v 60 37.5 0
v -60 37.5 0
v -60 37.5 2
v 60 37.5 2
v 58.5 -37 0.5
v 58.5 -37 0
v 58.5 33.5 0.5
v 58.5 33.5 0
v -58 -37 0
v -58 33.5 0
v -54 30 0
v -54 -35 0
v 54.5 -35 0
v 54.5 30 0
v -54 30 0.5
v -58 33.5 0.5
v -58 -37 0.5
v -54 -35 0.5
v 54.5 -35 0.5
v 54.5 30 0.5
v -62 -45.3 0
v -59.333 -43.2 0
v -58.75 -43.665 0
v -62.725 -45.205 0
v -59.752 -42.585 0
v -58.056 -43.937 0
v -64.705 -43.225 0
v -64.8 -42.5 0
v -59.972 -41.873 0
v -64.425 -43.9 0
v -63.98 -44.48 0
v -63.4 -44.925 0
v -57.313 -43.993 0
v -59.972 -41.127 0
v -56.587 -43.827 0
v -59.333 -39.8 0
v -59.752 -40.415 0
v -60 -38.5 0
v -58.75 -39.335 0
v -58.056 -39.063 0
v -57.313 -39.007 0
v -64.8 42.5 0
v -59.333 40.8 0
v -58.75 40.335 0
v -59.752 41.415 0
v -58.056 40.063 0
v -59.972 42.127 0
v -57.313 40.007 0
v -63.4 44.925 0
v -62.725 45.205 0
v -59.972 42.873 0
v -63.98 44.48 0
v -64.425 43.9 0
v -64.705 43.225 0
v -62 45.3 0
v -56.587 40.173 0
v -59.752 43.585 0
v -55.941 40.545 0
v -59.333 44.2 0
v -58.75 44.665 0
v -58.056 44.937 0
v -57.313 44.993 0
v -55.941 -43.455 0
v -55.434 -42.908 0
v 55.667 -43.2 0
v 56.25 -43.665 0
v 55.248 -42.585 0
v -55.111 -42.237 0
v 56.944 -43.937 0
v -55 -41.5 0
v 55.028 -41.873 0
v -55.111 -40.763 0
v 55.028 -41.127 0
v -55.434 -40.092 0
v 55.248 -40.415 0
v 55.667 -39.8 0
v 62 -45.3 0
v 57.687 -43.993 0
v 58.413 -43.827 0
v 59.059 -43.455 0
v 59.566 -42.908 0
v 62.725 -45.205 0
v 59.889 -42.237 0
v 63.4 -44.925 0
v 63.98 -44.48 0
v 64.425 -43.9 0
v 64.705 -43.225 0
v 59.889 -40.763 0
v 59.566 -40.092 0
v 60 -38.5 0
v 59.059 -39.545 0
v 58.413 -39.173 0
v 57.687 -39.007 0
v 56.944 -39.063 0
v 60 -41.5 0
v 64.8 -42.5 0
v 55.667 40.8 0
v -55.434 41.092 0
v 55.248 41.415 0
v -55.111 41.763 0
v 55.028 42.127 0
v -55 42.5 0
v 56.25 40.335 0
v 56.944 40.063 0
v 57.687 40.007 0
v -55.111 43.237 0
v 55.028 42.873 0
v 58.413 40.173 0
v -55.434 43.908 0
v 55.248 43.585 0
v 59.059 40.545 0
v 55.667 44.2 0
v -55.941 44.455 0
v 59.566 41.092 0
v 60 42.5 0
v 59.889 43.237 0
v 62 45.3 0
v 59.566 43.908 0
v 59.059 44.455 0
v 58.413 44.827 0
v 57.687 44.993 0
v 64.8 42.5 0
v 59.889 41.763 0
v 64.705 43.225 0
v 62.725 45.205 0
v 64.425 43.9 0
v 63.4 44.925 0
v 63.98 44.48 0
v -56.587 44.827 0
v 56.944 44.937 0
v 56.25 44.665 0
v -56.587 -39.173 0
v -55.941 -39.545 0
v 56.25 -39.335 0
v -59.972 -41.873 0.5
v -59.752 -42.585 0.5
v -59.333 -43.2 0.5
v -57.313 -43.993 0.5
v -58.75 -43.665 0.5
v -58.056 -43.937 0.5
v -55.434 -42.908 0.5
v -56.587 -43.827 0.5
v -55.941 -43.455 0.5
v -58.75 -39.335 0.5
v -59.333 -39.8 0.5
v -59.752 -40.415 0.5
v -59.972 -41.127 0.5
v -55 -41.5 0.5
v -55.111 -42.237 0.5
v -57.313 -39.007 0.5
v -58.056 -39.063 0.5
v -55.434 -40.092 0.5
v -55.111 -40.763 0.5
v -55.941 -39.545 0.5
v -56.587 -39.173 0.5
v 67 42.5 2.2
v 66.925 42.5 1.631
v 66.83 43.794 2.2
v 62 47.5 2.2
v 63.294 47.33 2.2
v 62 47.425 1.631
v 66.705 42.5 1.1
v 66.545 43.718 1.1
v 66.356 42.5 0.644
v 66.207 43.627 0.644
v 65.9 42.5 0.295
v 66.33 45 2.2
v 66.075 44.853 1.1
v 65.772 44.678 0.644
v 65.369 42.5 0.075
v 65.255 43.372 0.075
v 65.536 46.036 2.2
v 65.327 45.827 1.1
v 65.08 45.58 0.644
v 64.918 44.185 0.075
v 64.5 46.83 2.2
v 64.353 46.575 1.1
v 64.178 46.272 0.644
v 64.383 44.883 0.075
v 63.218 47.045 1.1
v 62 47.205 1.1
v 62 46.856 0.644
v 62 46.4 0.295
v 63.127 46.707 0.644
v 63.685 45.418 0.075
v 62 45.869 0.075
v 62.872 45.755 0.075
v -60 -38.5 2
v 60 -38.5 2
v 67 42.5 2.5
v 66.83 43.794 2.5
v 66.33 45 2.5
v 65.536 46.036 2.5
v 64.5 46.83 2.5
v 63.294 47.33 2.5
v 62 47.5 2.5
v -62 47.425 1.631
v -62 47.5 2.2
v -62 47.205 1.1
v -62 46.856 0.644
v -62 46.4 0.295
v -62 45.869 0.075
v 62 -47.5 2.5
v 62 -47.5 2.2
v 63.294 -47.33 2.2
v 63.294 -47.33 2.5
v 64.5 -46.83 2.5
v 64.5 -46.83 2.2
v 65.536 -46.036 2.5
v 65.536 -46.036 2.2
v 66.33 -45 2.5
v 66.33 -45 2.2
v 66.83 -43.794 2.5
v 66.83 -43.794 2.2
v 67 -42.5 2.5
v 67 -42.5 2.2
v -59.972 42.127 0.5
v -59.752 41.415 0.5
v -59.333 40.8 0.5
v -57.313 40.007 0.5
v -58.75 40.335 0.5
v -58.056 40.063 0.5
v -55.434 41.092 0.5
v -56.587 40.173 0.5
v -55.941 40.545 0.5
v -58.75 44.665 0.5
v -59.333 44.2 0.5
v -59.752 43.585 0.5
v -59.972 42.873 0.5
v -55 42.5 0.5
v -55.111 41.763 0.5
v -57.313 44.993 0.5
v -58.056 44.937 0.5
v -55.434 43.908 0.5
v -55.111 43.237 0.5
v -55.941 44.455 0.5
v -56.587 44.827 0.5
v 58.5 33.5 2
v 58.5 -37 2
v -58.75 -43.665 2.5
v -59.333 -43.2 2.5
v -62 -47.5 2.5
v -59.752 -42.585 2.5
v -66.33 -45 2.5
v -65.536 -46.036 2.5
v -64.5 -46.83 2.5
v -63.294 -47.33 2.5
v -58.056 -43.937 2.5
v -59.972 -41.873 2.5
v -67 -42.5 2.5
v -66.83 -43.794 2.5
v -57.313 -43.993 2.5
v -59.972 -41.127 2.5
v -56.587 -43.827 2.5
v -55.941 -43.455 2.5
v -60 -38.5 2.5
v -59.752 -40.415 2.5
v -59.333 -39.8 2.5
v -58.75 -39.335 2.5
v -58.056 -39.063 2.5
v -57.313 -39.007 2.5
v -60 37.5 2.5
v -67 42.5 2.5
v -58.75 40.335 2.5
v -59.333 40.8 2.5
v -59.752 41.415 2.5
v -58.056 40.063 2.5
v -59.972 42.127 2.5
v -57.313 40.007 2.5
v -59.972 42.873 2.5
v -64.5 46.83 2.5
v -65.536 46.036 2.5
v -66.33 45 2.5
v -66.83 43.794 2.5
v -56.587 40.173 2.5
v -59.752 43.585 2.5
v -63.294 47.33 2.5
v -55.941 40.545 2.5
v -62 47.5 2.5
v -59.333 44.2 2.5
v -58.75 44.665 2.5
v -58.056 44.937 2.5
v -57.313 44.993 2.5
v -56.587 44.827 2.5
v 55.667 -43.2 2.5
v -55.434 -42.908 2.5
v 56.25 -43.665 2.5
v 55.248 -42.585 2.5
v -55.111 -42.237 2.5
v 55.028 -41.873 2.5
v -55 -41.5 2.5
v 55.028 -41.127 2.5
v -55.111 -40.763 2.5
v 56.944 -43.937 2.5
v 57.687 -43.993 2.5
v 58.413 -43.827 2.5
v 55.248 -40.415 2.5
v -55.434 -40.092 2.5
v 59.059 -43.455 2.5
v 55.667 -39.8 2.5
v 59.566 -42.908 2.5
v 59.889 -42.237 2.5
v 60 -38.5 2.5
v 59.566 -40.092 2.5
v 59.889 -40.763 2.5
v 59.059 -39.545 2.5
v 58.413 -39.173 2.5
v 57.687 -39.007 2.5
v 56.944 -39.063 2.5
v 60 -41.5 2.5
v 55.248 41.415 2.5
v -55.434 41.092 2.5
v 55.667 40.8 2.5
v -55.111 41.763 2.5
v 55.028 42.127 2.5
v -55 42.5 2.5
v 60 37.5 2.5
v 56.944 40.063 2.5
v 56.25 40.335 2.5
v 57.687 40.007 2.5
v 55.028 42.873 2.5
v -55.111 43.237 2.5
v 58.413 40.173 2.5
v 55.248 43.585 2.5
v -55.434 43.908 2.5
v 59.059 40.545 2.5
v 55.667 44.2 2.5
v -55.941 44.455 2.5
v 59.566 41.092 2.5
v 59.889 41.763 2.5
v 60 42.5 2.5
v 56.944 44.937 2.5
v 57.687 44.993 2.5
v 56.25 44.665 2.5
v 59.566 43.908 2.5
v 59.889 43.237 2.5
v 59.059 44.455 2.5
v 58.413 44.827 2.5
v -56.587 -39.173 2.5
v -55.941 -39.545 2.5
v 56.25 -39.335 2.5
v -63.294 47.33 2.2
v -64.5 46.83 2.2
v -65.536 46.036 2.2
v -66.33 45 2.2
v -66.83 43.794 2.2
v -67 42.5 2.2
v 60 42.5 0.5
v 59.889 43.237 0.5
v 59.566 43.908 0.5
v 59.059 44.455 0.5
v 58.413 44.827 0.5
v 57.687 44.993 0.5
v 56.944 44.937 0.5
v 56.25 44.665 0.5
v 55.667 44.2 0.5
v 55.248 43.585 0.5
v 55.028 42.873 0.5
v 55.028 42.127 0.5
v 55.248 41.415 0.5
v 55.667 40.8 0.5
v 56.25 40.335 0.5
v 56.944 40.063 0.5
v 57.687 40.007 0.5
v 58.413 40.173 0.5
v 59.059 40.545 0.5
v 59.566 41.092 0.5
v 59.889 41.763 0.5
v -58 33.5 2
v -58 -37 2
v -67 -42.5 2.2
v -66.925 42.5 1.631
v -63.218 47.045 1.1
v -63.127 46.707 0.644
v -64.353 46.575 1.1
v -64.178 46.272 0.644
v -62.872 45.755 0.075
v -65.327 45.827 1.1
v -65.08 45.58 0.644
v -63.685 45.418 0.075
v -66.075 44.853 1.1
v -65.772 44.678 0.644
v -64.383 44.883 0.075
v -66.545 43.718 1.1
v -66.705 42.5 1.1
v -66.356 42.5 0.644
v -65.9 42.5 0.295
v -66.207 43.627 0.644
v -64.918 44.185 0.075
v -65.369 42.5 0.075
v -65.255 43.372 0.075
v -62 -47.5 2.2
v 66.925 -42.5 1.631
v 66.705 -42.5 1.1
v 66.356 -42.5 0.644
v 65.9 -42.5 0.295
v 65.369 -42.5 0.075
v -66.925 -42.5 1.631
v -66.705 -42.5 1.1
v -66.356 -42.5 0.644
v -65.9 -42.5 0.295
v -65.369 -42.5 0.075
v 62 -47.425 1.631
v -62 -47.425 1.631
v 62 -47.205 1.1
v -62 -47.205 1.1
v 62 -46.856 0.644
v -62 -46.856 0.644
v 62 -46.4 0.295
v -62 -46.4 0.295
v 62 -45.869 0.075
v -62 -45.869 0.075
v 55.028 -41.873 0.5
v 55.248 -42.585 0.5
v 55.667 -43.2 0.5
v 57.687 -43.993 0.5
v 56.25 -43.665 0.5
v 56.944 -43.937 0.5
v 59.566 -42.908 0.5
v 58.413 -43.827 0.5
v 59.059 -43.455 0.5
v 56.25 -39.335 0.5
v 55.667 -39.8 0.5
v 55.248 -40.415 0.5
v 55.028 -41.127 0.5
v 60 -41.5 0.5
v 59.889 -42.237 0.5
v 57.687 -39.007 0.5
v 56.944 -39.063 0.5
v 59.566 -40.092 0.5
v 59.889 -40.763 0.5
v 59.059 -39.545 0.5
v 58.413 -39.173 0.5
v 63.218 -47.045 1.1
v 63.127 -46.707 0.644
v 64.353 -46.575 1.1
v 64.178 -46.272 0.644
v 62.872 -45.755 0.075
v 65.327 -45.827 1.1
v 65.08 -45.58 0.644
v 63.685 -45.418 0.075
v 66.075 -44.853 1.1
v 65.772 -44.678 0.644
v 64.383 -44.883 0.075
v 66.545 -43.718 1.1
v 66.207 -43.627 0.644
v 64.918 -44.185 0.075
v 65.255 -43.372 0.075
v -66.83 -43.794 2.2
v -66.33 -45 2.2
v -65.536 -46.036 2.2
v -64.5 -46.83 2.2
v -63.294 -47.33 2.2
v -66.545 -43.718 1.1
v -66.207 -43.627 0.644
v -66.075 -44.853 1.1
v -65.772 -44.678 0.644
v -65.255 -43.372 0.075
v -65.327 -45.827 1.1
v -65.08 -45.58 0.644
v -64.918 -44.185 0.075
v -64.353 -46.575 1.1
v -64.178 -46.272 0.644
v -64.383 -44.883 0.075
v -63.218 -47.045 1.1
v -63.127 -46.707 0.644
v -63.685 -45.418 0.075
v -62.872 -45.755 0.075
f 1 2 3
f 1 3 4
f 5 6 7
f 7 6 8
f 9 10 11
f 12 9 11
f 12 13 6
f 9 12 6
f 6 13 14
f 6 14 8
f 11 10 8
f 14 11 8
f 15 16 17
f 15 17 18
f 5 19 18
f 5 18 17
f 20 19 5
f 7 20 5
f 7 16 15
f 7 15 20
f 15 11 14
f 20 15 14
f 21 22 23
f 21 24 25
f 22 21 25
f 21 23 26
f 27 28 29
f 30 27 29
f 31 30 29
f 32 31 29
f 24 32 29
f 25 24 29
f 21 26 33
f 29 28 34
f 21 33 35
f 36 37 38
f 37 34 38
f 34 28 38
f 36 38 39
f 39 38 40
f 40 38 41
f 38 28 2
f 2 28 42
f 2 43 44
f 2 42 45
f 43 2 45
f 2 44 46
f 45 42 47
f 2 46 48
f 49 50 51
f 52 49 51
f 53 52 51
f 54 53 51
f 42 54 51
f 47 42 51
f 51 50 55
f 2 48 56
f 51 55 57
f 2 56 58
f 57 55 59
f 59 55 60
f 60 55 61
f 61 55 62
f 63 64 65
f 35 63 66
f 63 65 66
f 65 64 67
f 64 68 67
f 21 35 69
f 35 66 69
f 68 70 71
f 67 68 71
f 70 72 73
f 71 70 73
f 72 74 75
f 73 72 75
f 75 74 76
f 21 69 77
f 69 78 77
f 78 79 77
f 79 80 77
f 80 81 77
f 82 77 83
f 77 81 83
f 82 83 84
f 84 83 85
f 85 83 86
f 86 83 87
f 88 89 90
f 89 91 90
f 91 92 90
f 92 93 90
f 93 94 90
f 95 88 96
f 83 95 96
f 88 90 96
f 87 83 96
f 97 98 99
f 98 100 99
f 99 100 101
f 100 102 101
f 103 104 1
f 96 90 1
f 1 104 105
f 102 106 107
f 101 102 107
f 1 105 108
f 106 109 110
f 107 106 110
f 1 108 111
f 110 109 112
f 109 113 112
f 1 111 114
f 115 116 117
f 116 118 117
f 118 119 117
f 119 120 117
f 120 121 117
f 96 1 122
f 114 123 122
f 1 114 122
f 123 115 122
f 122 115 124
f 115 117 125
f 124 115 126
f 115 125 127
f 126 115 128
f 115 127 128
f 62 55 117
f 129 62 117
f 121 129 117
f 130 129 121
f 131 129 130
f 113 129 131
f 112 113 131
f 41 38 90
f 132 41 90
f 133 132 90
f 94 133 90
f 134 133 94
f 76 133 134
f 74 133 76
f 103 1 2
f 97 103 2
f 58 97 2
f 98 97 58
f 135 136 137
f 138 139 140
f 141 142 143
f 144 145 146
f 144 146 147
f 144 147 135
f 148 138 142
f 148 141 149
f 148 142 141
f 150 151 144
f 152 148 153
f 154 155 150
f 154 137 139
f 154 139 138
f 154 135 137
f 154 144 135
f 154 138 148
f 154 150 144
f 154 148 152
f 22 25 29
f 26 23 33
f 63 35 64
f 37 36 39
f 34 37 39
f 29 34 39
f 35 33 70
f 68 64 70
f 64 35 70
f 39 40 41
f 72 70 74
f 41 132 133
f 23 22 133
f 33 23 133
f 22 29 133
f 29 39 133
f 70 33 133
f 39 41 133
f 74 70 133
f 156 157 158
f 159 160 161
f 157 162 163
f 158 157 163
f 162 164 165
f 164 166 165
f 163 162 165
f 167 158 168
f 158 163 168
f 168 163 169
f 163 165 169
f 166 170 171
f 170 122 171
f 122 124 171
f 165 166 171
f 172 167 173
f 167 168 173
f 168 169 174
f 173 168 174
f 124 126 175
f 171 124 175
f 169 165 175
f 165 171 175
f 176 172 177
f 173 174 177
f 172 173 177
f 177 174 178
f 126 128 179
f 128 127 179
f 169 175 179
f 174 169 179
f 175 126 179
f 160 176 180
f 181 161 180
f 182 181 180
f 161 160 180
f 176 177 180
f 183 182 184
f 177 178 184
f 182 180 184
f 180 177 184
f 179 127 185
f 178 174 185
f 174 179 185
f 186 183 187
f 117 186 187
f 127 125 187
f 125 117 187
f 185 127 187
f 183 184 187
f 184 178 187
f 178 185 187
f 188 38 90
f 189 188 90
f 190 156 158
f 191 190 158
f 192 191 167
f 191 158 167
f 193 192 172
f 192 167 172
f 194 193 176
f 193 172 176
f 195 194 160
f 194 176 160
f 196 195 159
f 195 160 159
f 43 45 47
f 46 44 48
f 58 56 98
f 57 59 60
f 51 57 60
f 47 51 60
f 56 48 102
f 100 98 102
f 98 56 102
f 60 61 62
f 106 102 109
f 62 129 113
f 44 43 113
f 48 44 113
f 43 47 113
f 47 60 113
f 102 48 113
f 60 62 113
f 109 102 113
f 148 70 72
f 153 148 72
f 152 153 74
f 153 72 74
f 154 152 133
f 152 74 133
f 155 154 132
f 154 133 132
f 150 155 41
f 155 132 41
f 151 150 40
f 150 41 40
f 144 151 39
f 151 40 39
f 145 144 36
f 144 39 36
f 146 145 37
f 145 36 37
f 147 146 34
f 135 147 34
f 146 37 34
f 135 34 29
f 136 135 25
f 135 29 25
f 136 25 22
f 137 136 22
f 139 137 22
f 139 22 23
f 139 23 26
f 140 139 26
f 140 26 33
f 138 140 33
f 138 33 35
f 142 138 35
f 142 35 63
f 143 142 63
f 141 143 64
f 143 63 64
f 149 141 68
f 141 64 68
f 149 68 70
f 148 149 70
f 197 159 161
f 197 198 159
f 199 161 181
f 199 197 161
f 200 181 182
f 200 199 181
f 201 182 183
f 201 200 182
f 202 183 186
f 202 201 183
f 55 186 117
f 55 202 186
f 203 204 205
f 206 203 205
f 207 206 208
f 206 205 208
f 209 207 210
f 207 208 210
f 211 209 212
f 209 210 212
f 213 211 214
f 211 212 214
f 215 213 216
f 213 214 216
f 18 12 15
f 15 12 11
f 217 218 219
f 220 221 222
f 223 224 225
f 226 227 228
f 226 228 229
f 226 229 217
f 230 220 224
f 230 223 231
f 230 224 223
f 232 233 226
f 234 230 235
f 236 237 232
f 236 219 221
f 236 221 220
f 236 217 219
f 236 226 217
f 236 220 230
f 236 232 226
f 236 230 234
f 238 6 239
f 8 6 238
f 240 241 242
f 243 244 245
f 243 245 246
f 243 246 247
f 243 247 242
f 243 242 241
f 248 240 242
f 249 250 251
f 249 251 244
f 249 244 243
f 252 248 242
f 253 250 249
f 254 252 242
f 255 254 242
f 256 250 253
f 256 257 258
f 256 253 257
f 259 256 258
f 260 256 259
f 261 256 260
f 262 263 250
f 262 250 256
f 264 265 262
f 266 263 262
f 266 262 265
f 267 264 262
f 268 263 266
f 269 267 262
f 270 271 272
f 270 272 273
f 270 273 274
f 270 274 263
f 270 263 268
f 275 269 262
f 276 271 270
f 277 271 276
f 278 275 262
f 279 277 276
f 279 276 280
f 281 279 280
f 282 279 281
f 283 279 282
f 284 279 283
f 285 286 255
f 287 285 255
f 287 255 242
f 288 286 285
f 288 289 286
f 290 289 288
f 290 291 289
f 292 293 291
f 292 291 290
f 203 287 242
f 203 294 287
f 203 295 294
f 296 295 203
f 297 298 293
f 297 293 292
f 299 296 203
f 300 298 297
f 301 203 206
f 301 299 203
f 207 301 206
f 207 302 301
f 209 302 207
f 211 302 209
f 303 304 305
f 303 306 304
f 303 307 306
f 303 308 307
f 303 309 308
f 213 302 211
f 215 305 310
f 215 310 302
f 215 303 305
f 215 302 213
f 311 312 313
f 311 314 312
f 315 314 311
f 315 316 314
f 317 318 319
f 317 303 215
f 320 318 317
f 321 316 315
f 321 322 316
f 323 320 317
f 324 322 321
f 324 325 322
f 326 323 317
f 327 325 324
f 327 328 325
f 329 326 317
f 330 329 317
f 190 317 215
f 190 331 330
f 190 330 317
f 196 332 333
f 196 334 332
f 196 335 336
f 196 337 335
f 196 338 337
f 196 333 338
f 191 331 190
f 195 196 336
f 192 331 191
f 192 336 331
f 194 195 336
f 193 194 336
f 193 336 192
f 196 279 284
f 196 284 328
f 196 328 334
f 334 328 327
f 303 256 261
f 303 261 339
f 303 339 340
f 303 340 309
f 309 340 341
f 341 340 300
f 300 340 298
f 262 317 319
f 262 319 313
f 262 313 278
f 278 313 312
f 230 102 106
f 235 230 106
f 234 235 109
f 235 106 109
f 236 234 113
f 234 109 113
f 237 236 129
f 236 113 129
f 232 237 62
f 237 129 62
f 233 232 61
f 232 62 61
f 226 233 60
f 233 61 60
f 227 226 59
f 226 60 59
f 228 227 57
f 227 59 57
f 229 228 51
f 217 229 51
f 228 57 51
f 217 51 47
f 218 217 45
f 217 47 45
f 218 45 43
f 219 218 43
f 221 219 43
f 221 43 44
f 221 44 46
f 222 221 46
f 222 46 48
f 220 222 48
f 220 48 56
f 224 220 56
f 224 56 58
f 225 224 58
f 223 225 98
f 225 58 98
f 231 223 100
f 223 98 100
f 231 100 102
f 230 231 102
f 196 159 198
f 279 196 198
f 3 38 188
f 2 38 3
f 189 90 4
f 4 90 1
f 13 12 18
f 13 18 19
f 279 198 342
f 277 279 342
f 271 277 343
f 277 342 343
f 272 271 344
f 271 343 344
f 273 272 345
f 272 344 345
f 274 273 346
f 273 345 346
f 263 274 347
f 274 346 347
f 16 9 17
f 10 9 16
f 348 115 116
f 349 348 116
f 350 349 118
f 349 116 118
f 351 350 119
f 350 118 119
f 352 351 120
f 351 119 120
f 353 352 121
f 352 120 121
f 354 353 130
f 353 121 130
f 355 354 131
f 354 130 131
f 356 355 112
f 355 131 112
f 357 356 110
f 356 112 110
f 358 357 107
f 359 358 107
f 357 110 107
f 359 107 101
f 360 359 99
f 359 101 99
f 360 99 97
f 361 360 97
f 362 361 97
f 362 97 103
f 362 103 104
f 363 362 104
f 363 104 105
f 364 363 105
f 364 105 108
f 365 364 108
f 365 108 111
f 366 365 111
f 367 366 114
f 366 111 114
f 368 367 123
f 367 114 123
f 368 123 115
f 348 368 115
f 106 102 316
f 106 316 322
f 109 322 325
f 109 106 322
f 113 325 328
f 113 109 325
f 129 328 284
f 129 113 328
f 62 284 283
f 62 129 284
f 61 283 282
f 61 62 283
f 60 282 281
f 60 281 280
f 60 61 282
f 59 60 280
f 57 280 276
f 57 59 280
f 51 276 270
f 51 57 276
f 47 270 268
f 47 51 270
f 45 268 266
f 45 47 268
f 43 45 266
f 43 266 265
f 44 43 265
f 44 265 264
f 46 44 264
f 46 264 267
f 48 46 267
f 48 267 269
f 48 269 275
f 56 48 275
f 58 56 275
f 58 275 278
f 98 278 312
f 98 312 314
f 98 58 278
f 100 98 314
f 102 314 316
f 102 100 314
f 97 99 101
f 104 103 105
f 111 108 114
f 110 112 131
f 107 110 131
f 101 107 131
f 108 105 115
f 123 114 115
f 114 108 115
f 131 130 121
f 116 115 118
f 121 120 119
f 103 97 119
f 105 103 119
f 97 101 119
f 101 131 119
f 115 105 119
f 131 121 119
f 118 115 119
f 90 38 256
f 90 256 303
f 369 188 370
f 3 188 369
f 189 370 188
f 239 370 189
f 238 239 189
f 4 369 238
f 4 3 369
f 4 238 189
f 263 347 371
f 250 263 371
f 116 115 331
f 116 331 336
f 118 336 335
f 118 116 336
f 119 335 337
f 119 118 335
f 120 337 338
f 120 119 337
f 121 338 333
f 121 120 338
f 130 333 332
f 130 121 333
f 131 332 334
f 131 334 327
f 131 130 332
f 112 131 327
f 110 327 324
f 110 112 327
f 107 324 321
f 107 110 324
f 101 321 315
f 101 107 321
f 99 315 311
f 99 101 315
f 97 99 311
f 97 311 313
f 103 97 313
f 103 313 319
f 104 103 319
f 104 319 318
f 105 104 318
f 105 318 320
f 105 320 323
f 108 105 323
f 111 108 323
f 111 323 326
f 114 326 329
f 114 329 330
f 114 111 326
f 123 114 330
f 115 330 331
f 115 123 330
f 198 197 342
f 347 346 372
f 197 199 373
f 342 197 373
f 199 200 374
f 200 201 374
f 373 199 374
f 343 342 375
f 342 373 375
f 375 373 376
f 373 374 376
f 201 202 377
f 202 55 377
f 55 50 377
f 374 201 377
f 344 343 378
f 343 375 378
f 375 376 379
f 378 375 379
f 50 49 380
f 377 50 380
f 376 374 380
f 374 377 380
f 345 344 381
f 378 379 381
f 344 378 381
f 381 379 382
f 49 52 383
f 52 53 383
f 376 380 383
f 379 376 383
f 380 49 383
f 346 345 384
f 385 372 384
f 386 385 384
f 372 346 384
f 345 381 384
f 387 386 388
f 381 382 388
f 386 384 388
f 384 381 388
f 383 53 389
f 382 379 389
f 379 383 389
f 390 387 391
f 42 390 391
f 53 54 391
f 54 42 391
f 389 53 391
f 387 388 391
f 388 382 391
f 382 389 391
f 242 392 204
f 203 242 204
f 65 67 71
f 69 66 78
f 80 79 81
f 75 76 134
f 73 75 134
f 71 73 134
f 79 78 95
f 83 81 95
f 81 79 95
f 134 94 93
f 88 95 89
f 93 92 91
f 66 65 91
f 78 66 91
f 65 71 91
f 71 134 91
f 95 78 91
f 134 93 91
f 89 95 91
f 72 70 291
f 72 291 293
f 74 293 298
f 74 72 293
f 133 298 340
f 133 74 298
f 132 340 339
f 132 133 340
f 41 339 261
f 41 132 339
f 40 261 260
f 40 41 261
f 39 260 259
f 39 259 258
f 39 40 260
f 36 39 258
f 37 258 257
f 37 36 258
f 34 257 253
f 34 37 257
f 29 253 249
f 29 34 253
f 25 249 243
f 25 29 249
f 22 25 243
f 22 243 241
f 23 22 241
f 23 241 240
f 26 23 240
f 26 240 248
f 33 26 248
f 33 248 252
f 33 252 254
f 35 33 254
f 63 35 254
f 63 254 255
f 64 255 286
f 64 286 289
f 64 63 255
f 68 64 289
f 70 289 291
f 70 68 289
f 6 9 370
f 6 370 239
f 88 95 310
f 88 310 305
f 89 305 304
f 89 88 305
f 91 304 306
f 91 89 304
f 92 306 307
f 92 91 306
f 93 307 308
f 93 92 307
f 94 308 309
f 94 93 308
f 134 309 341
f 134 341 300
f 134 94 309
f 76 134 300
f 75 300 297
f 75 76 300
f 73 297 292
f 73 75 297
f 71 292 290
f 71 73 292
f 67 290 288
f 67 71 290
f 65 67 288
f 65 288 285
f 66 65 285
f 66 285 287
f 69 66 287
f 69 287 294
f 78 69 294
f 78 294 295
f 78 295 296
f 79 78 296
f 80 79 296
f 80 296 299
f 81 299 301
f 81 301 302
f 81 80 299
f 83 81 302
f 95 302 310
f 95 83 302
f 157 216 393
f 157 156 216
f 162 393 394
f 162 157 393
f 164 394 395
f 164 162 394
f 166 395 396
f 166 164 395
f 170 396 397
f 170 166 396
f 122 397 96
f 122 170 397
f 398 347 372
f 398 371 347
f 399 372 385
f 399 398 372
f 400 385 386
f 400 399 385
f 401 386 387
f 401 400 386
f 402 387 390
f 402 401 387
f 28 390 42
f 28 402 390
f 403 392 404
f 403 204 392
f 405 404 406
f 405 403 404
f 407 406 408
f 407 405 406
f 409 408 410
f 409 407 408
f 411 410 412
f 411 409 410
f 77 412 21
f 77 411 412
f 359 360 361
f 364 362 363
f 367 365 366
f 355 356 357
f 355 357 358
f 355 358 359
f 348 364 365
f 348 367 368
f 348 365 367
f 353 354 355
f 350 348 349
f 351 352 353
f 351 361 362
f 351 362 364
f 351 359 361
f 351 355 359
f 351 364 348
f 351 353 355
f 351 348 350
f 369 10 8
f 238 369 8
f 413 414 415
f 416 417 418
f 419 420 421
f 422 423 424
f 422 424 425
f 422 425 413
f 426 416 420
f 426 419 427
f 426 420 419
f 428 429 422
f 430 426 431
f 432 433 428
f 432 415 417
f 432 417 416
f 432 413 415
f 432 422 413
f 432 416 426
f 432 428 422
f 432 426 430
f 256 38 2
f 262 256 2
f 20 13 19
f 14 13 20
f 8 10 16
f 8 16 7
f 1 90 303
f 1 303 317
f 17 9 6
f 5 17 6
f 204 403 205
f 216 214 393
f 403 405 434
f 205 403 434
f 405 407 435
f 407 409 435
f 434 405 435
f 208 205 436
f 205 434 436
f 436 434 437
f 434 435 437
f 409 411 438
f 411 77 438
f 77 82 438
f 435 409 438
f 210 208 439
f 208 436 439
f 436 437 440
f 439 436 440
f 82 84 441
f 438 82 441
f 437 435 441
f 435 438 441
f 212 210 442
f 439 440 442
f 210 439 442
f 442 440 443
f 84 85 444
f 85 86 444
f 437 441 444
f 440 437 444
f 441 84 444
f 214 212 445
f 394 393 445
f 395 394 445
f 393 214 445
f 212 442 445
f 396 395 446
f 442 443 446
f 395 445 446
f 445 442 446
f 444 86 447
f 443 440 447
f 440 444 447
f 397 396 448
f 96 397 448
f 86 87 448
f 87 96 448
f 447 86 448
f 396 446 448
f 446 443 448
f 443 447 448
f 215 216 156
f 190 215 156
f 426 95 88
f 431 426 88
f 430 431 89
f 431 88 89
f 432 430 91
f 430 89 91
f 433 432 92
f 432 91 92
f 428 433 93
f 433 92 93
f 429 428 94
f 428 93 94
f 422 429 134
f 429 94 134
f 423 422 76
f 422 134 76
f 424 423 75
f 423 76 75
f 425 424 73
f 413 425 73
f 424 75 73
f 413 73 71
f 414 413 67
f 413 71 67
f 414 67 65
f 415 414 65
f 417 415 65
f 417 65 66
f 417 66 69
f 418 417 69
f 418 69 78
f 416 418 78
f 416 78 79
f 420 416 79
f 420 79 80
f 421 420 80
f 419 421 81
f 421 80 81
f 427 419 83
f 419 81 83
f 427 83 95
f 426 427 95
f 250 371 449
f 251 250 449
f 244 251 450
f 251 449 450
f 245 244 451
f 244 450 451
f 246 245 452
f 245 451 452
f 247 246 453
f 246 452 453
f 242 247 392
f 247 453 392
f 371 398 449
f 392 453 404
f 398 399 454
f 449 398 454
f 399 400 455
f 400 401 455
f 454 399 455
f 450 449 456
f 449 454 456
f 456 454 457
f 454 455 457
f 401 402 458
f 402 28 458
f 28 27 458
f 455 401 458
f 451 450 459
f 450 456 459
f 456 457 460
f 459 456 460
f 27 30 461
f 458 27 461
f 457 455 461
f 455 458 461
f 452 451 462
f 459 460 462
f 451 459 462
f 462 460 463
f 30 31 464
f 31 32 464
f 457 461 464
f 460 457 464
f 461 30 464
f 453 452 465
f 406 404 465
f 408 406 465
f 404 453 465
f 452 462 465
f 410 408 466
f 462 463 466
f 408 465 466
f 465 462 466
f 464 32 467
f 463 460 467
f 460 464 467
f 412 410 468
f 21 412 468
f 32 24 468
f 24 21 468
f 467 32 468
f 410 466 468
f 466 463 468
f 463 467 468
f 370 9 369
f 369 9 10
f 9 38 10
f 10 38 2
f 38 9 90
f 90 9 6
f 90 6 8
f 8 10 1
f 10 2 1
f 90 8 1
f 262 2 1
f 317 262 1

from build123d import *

# Parameters (mm, degrees)
F0_R     = 2.5
F0_W     = 120
F0_H     = 76
F1_DEPTH = 2.5
F0_W_2   = 116.5
F0_H_2   = 70.5
F0_W_3   = 108.5
F0_H_3   = 65
F2_DEPTH = 0.5
F3_DEPTH = 2
F4_R     = 2.2


with BuildPart() as f1:
    # F0 (on Top) → F1 (new body)
    with BuildSketch(Plane.XY):
        with BuildLine():
            Line((62, 47.5), (-62, 47.5))
            ThreePointArc((-62, 47.5), (-65.535534, 46.035534), (-67, 42.5))
            Line((-67, 42.5), (-67, -42.5))
            ThreePointArc((-67, -42.5), (-65.535534, -46.035534), (-62, -47.5))
            Line((-62, -47.5), (62, -47.5))
            ThreePointArc((62, -47.5), (65.535534, -46.035534), (67, -42.5))
            Line((67, -42.5), (67, 42.5))
            ThreePointArc((67, 42.5), (65.535534, 46.035534), (62, 47.5))
        make_face()
        with Locations((-57.5, -41.5)):
            Circle(F0_R, mode=Mode.SUBTRACT)
        with Locations((57.5, -41.5)):
            Circle(F0_R, mode=Mode.SUBTRACT)
        with Locations((0, -0.5)):
            Rectangle(F0_W, F0_H, mode=Mode.SUBTRACT)
        with Locations((-57.5, 42.5)):
            Circle(F0_R, mode=Mode.SUBTRACT)
        with Locations((57.5, 42.5)):
            Circle(F0_R, mode=Mode.SUBTRACT)
    extrude(amount=F1_DEPTH)

    # F4
    f4_edges = [f1.edges().sort_by_distance(p)[0] for p in [
        (-65.535534, 46.035534, 0),
    ]]
    fillet(f4_edges, radius=F4_R)


with BuildPart() as f2:
    # F0 (on Top) → F2 (new body)
    with BuildSketch(Plane.XY):
        with Locations((0.25, -1.75)):
            Rectangle(F0_W_2, F0_H_2)
        with Locations((0.25, -2.5)):
            Rectangle(F0_W_3, F0_H_3, mode=Mode.SUBTRACT)
        with Locations((57.5, 42.5)):
            Circle(F0_R)
        with Locations((57.5, -41.5)):
            Circle(F0_R)
        with Locations((-57.5, -41.5)):
            Circle(F0_R)
        with Locations((-57.5, 42.5)):
            Circle(F0_R)
    extrude(amount=F2_DEPTH)


with BuildPart() as f3:
    # F0 (on Top) → F3 (new body)
    with BuildSketch(Plane.XY):
        with Locations((0, -0.5)):
            Rectangle(F0_W, F0_H)
        with Locations((0.25, -1.75)):
            Rectangle(F0_W_2, F0_H_2, mode=Mode.SUBTRACT)
    extrude(amount=F3_DEPTH)


solid = Compound([f1.part, f2.part, f3.part])
